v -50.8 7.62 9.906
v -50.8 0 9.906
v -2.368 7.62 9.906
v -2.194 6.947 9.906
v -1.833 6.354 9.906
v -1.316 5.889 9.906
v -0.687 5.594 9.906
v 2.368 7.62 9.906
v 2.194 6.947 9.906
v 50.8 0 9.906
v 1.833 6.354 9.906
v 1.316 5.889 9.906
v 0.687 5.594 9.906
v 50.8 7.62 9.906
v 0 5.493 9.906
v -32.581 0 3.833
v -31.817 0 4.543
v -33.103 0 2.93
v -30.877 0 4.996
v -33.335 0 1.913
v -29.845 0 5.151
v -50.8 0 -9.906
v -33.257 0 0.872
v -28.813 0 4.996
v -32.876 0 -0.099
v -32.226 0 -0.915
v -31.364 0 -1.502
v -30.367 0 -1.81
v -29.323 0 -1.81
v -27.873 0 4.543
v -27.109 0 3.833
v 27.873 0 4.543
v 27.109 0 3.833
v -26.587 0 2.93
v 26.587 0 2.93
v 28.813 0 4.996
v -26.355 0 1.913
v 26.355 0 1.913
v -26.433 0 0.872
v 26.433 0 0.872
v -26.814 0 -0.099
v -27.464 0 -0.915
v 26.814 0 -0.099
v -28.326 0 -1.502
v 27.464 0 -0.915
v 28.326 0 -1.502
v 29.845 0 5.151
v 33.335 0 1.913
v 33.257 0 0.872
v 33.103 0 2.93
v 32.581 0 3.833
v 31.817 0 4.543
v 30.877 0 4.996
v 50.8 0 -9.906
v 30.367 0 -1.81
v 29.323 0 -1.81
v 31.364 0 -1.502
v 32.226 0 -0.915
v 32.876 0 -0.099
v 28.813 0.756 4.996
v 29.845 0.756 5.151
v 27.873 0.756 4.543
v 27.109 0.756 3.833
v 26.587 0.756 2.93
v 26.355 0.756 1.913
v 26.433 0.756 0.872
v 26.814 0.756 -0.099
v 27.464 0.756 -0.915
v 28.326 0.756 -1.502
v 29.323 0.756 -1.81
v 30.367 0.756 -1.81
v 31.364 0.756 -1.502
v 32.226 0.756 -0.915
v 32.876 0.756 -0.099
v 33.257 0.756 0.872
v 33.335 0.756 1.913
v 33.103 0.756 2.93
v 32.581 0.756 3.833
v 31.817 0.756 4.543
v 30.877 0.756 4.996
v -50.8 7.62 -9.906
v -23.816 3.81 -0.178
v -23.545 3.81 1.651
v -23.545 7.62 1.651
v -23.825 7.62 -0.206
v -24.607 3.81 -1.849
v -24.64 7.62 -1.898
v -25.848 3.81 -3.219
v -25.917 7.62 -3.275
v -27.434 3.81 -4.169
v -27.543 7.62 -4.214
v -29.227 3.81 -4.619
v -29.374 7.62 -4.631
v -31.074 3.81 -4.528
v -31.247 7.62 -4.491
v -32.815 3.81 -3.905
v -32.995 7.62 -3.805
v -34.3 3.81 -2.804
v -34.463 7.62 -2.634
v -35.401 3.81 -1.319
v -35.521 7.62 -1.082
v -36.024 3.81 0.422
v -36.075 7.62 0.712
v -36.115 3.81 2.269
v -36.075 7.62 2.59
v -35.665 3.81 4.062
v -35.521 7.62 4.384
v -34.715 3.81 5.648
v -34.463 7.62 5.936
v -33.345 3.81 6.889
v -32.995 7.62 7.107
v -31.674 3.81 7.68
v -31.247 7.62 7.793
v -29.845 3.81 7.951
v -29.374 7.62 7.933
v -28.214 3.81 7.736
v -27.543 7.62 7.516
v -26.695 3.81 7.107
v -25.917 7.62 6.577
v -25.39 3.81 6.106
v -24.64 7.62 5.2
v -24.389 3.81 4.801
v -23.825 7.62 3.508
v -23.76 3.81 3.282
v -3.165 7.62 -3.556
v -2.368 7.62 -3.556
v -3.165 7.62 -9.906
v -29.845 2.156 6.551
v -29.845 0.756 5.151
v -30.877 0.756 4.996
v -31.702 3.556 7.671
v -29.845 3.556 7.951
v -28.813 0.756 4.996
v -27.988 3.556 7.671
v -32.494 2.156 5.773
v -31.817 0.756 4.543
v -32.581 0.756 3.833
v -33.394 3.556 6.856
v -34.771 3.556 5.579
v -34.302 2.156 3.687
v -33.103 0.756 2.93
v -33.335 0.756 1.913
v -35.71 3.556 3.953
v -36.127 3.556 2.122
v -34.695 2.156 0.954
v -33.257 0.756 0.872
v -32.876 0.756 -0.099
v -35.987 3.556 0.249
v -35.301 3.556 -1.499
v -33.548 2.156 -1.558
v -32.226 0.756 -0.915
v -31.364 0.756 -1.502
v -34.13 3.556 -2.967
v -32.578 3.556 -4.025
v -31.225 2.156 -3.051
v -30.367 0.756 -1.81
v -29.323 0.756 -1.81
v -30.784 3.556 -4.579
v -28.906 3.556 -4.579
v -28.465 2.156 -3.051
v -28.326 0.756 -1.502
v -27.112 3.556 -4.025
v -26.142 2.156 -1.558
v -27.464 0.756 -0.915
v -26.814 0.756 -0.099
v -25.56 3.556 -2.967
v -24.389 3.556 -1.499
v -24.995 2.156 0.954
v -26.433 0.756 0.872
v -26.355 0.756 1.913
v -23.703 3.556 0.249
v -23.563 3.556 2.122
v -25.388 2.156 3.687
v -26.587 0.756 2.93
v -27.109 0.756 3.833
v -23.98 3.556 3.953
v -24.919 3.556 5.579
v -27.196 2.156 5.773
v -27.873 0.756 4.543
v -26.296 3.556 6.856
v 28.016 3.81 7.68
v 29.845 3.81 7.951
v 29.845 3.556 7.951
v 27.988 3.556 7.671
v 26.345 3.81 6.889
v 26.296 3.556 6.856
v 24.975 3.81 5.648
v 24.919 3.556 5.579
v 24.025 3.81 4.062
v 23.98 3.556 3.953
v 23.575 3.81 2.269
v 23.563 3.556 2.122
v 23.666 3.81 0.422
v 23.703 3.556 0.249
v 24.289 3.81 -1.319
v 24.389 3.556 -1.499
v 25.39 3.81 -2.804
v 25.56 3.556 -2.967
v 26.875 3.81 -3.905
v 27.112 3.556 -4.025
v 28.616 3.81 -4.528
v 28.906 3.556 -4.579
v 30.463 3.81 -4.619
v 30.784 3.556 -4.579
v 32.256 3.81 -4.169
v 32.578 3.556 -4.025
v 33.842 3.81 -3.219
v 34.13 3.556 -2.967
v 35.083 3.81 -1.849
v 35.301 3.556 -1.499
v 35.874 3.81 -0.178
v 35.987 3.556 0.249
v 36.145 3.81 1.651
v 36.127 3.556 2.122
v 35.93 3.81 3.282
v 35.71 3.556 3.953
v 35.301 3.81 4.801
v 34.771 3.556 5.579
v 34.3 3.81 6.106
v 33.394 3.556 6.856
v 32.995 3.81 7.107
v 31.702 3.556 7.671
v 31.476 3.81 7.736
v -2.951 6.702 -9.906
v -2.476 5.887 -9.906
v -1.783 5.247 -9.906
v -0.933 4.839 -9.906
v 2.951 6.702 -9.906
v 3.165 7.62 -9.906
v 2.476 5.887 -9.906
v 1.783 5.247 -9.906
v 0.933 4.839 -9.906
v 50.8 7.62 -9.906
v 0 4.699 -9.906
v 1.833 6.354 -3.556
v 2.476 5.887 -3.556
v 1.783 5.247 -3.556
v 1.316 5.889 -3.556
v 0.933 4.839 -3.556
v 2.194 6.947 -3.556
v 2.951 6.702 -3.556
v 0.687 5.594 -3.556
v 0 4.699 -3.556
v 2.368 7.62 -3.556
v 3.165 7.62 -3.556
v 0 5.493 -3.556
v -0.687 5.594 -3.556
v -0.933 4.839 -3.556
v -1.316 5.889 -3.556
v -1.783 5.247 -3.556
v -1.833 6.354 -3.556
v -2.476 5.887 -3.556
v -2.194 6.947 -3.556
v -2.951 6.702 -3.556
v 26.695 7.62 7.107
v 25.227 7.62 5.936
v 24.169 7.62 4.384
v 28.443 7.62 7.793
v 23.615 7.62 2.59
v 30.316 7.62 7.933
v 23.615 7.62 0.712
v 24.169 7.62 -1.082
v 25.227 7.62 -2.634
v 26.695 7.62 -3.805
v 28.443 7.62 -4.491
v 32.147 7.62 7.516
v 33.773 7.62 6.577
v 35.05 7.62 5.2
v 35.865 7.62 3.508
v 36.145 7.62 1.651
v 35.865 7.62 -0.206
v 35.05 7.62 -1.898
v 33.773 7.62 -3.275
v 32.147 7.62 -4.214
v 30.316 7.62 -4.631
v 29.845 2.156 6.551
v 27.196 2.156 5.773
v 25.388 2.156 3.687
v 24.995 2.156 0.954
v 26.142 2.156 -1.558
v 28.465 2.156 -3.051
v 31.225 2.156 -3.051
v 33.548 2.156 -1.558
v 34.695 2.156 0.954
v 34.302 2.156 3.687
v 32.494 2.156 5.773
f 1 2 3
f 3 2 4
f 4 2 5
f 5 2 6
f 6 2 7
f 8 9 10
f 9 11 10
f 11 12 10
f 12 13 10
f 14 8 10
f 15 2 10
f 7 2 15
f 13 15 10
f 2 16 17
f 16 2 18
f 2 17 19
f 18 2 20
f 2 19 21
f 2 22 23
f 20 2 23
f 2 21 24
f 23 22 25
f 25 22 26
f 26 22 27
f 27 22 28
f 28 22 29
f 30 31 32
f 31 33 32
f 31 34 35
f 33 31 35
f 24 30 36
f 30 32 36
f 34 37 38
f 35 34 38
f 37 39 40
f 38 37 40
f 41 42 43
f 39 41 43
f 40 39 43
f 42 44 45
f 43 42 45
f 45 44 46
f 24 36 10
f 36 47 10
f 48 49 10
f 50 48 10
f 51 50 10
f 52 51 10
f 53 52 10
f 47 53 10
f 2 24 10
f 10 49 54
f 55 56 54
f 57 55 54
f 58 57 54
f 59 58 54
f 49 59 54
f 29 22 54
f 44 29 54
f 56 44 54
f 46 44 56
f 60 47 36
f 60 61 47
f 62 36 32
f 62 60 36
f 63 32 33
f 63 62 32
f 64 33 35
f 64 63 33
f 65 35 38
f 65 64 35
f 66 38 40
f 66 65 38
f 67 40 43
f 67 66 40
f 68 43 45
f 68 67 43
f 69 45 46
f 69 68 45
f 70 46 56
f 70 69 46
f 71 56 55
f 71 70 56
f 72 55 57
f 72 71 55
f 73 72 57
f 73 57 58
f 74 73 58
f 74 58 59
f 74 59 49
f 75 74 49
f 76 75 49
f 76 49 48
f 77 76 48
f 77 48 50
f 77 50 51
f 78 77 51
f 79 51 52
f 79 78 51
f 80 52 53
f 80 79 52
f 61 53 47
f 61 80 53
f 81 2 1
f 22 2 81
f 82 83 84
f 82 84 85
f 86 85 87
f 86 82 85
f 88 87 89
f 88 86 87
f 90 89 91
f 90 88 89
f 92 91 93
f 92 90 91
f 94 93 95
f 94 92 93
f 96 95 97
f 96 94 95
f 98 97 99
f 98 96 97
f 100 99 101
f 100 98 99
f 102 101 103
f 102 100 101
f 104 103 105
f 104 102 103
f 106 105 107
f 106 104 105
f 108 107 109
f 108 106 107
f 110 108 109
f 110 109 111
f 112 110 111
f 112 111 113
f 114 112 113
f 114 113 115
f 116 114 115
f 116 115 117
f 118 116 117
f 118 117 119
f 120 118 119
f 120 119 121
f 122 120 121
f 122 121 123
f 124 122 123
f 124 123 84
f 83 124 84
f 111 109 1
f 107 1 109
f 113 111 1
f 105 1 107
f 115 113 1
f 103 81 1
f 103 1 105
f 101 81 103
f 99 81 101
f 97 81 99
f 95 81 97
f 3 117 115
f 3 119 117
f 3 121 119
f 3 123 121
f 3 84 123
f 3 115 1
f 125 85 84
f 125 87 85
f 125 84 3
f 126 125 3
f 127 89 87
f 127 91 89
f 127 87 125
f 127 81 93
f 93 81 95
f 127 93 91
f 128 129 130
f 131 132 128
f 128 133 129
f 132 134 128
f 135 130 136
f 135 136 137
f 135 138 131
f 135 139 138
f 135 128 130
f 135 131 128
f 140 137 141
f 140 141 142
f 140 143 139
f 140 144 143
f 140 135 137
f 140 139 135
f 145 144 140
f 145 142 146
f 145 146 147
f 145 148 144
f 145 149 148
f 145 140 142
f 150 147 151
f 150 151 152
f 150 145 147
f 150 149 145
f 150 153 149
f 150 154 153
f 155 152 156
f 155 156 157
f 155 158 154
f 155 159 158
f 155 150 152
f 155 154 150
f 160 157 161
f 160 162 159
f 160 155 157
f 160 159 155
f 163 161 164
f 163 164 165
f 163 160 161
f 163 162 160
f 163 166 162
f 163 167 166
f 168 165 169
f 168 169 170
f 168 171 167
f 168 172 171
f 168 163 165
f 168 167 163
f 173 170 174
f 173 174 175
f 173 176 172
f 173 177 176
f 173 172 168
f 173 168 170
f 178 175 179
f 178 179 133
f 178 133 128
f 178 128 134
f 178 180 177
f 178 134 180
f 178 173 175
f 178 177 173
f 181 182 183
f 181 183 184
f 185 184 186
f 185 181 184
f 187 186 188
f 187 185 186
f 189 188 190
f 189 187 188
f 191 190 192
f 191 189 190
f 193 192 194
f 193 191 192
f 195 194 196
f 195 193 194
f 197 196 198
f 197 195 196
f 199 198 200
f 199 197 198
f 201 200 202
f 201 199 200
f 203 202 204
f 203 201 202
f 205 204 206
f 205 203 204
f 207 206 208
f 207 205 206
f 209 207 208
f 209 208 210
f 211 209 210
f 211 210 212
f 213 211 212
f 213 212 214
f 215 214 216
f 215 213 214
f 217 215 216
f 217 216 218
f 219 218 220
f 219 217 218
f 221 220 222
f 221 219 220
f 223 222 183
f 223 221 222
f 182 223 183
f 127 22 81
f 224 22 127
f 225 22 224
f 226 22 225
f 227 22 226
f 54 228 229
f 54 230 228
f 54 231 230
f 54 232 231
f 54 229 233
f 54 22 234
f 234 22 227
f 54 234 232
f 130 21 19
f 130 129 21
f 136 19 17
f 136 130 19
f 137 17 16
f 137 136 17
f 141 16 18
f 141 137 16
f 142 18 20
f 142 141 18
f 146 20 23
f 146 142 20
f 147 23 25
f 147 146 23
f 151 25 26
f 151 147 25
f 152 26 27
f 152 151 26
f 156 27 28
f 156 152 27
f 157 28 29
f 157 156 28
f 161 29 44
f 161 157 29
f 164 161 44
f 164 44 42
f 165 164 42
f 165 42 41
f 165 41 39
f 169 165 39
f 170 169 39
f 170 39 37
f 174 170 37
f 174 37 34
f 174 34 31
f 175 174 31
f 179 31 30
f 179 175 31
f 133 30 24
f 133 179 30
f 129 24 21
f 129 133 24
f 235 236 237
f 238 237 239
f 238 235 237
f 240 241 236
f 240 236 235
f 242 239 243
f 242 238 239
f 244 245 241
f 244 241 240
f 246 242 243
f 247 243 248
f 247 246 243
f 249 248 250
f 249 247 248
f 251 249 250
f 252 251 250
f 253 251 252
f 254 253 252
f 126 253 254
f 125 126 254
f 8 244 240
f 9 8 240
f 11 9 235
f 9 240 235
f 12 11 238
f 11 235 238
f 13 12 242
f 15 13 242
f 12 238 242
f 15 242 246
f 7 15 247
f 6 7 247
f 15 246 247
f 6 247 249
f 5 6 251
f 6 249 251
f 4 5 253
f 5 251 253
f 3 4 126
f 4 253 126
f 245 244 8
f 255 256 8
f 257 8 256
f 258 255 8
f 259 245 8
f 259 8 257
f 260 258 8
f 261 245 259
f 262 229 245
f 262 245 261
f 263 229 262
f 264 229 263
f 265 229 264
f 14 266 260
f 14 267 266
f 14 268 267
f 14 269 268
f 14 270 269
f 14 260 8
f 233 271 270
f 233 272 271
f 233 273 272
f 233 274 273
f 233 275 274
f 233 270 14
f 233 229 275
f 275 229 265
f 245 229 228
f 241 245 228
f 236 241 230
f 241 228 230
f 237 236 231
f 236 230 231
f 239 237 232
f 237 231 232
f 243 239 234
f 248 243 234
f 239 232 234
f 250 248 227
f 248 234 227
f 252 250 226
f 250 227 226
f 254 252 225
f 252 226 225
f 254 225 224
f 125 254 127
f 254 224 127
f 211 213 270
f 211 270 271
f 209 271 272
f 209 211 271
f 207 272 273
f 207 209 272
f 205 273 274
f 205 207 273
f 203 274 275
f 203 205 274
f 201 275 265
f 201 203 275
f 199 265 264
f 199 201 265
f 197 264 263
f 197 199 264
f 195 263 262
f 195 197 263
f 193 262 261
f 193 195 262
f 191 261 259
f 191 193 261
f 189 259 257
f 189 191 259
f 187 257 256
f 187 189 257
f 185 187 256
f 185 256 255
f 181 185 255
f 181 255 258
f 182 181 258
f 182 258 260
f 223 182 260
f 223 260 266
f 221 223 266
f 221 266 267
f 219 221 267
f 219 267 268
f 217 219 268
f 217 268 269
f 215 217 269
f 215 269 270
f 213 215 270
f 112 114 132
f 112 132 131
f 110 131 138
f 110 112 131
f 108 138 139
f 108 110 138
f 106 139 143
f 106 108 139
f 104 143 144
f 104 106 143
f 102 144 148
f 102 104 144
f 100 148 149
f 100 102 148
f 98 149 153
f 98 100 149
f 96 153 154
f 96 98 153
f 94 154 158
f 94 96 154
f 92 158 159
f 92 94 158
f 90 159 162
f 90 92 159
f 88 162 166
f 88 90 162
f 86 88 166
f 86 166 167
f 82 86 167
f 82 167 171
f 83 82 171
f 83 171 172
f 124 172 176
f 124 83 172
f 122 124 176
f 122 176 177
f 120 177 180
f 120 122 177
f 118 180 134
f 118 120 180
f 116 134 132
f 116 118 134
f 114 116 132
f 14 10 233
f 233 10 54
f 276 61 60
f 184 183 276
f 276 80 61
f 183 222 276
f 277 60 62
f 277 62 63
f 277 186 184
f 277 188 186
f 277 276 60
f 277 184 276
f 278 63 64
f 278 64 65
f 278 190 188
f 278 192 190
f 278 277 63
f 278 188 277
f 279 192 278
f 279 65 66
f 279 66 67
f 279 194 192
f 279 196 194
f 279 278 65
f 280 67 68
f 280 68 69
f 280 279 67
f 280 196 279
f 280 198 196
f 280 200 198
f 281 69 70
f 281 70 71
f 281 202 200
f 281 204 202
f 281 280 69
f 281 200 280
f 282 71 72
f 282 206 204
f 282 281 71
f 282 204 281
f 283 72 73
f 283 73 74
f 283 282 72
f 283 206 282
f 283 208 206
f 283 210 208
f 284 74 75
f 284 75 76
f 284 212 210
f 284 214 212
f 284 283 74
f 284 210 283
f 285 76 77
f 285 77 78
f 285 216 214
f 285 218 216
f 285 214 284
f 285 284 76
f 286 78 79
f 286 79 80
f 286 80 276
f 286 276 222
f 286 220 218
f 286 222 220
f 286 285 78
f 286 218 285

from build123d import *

# Parameters (mm, degrees)
SKETCH1_W                                    = 101.6
SKETCH1_H                                    = 19.812
BOSS_EXTRUDE1_DEPTH                          = 3.81
CSK_FOR_M6_COUNTERSUNK_FLAT_HEAD_SCR_2_COUNT = 2
CSK_FOR_M6_COUNTERSUNK_FLAT_HEAD_SCR_2_PITCH = 59.69
SKETCH5_W                                    = 101.6
SKETCH5_H                                    = 19.812
SKETCH5_R                                    = 6.3
BOSS_EXTRUDE2_DEPTH                          = 3.81
SKETCH6_R                                    = 3.175
CUT_EXTRUDE1_DEPTH                           = 6.35
CUT_EXTRUDE2_DEPTH                           = 7.35
CUT_EXTRUDE2_DEPTH_BACK                      = 14.462


with BuildPart() as part:
    # Sketch1 → Boss-Extrude1 (new body)
    with BuildSketch(Plane(origin=(0, 0, 0), x_dir=(1, 0, 0), z_dir=(0, 1, 0))):
        Rectangle(SKETCH1_W, SKETCH1_H)
    extrude(amount=BOSS_EXTRUDE1_DEPTH)

    # Sketch4 → CSK for M6 Countersunk Flat Head Screw1 (revolve, cut)
    with BuildSketch(Plane(origin=(-29.845, 3.81, 1.651), x_dir=(0, 0, 1), z_dir=(1, 0, 0))):
        Polygon((0, 0), (0, 3.81), (3.5, 3.81), (3.5, 3.054), (6.3, 0.254), (6.3, 0), align=None)
    csk_for_m6_countersunk_flat_head_screw1 = revolve(axis=Axis((-29.845, 10.16, 1.651), (0, -1, 0)), mode=Mode.SUBTRACT)

    # CSK for M6 Countersunk Flat Head Scr 2: CSK for M6 Countersunk Flat Head Screw1 ×2
    with Locations(*[(i * CSK_FOR_M6_COUNTERSUNK_FLAT_HEAD_SCR_2_PITCH, 0, 0) for i in range(1, CSK_FOR_M6_COUNTERSUNK_FLAT_HEAD_SCR_2_COUNT)]):
        add(csk_for_m6_countersunk_flat_head_screw1, mode=Mode.SUBTRACT)

    # Sketch5 → Boss-Extrude2 (add)
    with BuildSketch(Plane(origin=(0, 3.81, 0), x_dir=(1, 0, 0), z_dir=(0, 1, 0))):
        Rectangle(SKETCH5_W, SKETCH5_H)
        with Locations((-29.845, -1.651)):
            Circle(SKETCH5_R, mode=Mode.SUBTRACT)
        with Locations((29.845, -1.651)):
            Circle(SKETCH5_R, mode=Mode.SUBTRACT)
    extrude(amount=BOSS_EXTRUDE2_DEPTH)

    # Sketch6 → Cut-Extrude1 (cut)
    with BuildSketch(Plane(origin=(0, 0, -9.906), x_dir=(-1, 0, 0), z_dir=(0, 0, -1))):
        with Locations((0, 7.874)):
            Circle(SKETCH6_R)
    extrude(amount=-CUT_EXTRUDE1_DEPTH, mode=Mode.SUBTRACT)

    # Sketch7 → Cut-Extrude2 (cut, two sides)
    with BuildSketch(Plane(origin=(0, 0, -3.556), x_dir=(-1, 0, 0), z_dir=(0, 0, -1))) as cut_extrude2_sk:
        with BuildLine():
            ThreePointArc((-2.36766458, 7.62), (0, 5.49275), (2.36766458, 7.62))
            Line((2.36766458, 7.62), (-2.36766458, 7.62))
        make_face()
        with BuildLine():
            Line((-2.36766458, 7.62), (2.36766458, 7.62))
            ThreePointArc((2.36766458, 7.62), (2.377851219, 7.746818473), (2.38125, 7.874))
            ThreePointArc((2.38125, 7.874), (-0.127181527, 10.251851219), (-2.36766458, 7.62))
        make_face()
    extrude(amount=CUT_EXTRUDE2_DEPTH, mode=Mode.SUBTRACT)
    extrude(cut_extrude2_sk.sketch, amount=-CUT_EXTRUDE2_DEPTH_BACK, mode=Mode.SUBTRACT)


solid = part.part
